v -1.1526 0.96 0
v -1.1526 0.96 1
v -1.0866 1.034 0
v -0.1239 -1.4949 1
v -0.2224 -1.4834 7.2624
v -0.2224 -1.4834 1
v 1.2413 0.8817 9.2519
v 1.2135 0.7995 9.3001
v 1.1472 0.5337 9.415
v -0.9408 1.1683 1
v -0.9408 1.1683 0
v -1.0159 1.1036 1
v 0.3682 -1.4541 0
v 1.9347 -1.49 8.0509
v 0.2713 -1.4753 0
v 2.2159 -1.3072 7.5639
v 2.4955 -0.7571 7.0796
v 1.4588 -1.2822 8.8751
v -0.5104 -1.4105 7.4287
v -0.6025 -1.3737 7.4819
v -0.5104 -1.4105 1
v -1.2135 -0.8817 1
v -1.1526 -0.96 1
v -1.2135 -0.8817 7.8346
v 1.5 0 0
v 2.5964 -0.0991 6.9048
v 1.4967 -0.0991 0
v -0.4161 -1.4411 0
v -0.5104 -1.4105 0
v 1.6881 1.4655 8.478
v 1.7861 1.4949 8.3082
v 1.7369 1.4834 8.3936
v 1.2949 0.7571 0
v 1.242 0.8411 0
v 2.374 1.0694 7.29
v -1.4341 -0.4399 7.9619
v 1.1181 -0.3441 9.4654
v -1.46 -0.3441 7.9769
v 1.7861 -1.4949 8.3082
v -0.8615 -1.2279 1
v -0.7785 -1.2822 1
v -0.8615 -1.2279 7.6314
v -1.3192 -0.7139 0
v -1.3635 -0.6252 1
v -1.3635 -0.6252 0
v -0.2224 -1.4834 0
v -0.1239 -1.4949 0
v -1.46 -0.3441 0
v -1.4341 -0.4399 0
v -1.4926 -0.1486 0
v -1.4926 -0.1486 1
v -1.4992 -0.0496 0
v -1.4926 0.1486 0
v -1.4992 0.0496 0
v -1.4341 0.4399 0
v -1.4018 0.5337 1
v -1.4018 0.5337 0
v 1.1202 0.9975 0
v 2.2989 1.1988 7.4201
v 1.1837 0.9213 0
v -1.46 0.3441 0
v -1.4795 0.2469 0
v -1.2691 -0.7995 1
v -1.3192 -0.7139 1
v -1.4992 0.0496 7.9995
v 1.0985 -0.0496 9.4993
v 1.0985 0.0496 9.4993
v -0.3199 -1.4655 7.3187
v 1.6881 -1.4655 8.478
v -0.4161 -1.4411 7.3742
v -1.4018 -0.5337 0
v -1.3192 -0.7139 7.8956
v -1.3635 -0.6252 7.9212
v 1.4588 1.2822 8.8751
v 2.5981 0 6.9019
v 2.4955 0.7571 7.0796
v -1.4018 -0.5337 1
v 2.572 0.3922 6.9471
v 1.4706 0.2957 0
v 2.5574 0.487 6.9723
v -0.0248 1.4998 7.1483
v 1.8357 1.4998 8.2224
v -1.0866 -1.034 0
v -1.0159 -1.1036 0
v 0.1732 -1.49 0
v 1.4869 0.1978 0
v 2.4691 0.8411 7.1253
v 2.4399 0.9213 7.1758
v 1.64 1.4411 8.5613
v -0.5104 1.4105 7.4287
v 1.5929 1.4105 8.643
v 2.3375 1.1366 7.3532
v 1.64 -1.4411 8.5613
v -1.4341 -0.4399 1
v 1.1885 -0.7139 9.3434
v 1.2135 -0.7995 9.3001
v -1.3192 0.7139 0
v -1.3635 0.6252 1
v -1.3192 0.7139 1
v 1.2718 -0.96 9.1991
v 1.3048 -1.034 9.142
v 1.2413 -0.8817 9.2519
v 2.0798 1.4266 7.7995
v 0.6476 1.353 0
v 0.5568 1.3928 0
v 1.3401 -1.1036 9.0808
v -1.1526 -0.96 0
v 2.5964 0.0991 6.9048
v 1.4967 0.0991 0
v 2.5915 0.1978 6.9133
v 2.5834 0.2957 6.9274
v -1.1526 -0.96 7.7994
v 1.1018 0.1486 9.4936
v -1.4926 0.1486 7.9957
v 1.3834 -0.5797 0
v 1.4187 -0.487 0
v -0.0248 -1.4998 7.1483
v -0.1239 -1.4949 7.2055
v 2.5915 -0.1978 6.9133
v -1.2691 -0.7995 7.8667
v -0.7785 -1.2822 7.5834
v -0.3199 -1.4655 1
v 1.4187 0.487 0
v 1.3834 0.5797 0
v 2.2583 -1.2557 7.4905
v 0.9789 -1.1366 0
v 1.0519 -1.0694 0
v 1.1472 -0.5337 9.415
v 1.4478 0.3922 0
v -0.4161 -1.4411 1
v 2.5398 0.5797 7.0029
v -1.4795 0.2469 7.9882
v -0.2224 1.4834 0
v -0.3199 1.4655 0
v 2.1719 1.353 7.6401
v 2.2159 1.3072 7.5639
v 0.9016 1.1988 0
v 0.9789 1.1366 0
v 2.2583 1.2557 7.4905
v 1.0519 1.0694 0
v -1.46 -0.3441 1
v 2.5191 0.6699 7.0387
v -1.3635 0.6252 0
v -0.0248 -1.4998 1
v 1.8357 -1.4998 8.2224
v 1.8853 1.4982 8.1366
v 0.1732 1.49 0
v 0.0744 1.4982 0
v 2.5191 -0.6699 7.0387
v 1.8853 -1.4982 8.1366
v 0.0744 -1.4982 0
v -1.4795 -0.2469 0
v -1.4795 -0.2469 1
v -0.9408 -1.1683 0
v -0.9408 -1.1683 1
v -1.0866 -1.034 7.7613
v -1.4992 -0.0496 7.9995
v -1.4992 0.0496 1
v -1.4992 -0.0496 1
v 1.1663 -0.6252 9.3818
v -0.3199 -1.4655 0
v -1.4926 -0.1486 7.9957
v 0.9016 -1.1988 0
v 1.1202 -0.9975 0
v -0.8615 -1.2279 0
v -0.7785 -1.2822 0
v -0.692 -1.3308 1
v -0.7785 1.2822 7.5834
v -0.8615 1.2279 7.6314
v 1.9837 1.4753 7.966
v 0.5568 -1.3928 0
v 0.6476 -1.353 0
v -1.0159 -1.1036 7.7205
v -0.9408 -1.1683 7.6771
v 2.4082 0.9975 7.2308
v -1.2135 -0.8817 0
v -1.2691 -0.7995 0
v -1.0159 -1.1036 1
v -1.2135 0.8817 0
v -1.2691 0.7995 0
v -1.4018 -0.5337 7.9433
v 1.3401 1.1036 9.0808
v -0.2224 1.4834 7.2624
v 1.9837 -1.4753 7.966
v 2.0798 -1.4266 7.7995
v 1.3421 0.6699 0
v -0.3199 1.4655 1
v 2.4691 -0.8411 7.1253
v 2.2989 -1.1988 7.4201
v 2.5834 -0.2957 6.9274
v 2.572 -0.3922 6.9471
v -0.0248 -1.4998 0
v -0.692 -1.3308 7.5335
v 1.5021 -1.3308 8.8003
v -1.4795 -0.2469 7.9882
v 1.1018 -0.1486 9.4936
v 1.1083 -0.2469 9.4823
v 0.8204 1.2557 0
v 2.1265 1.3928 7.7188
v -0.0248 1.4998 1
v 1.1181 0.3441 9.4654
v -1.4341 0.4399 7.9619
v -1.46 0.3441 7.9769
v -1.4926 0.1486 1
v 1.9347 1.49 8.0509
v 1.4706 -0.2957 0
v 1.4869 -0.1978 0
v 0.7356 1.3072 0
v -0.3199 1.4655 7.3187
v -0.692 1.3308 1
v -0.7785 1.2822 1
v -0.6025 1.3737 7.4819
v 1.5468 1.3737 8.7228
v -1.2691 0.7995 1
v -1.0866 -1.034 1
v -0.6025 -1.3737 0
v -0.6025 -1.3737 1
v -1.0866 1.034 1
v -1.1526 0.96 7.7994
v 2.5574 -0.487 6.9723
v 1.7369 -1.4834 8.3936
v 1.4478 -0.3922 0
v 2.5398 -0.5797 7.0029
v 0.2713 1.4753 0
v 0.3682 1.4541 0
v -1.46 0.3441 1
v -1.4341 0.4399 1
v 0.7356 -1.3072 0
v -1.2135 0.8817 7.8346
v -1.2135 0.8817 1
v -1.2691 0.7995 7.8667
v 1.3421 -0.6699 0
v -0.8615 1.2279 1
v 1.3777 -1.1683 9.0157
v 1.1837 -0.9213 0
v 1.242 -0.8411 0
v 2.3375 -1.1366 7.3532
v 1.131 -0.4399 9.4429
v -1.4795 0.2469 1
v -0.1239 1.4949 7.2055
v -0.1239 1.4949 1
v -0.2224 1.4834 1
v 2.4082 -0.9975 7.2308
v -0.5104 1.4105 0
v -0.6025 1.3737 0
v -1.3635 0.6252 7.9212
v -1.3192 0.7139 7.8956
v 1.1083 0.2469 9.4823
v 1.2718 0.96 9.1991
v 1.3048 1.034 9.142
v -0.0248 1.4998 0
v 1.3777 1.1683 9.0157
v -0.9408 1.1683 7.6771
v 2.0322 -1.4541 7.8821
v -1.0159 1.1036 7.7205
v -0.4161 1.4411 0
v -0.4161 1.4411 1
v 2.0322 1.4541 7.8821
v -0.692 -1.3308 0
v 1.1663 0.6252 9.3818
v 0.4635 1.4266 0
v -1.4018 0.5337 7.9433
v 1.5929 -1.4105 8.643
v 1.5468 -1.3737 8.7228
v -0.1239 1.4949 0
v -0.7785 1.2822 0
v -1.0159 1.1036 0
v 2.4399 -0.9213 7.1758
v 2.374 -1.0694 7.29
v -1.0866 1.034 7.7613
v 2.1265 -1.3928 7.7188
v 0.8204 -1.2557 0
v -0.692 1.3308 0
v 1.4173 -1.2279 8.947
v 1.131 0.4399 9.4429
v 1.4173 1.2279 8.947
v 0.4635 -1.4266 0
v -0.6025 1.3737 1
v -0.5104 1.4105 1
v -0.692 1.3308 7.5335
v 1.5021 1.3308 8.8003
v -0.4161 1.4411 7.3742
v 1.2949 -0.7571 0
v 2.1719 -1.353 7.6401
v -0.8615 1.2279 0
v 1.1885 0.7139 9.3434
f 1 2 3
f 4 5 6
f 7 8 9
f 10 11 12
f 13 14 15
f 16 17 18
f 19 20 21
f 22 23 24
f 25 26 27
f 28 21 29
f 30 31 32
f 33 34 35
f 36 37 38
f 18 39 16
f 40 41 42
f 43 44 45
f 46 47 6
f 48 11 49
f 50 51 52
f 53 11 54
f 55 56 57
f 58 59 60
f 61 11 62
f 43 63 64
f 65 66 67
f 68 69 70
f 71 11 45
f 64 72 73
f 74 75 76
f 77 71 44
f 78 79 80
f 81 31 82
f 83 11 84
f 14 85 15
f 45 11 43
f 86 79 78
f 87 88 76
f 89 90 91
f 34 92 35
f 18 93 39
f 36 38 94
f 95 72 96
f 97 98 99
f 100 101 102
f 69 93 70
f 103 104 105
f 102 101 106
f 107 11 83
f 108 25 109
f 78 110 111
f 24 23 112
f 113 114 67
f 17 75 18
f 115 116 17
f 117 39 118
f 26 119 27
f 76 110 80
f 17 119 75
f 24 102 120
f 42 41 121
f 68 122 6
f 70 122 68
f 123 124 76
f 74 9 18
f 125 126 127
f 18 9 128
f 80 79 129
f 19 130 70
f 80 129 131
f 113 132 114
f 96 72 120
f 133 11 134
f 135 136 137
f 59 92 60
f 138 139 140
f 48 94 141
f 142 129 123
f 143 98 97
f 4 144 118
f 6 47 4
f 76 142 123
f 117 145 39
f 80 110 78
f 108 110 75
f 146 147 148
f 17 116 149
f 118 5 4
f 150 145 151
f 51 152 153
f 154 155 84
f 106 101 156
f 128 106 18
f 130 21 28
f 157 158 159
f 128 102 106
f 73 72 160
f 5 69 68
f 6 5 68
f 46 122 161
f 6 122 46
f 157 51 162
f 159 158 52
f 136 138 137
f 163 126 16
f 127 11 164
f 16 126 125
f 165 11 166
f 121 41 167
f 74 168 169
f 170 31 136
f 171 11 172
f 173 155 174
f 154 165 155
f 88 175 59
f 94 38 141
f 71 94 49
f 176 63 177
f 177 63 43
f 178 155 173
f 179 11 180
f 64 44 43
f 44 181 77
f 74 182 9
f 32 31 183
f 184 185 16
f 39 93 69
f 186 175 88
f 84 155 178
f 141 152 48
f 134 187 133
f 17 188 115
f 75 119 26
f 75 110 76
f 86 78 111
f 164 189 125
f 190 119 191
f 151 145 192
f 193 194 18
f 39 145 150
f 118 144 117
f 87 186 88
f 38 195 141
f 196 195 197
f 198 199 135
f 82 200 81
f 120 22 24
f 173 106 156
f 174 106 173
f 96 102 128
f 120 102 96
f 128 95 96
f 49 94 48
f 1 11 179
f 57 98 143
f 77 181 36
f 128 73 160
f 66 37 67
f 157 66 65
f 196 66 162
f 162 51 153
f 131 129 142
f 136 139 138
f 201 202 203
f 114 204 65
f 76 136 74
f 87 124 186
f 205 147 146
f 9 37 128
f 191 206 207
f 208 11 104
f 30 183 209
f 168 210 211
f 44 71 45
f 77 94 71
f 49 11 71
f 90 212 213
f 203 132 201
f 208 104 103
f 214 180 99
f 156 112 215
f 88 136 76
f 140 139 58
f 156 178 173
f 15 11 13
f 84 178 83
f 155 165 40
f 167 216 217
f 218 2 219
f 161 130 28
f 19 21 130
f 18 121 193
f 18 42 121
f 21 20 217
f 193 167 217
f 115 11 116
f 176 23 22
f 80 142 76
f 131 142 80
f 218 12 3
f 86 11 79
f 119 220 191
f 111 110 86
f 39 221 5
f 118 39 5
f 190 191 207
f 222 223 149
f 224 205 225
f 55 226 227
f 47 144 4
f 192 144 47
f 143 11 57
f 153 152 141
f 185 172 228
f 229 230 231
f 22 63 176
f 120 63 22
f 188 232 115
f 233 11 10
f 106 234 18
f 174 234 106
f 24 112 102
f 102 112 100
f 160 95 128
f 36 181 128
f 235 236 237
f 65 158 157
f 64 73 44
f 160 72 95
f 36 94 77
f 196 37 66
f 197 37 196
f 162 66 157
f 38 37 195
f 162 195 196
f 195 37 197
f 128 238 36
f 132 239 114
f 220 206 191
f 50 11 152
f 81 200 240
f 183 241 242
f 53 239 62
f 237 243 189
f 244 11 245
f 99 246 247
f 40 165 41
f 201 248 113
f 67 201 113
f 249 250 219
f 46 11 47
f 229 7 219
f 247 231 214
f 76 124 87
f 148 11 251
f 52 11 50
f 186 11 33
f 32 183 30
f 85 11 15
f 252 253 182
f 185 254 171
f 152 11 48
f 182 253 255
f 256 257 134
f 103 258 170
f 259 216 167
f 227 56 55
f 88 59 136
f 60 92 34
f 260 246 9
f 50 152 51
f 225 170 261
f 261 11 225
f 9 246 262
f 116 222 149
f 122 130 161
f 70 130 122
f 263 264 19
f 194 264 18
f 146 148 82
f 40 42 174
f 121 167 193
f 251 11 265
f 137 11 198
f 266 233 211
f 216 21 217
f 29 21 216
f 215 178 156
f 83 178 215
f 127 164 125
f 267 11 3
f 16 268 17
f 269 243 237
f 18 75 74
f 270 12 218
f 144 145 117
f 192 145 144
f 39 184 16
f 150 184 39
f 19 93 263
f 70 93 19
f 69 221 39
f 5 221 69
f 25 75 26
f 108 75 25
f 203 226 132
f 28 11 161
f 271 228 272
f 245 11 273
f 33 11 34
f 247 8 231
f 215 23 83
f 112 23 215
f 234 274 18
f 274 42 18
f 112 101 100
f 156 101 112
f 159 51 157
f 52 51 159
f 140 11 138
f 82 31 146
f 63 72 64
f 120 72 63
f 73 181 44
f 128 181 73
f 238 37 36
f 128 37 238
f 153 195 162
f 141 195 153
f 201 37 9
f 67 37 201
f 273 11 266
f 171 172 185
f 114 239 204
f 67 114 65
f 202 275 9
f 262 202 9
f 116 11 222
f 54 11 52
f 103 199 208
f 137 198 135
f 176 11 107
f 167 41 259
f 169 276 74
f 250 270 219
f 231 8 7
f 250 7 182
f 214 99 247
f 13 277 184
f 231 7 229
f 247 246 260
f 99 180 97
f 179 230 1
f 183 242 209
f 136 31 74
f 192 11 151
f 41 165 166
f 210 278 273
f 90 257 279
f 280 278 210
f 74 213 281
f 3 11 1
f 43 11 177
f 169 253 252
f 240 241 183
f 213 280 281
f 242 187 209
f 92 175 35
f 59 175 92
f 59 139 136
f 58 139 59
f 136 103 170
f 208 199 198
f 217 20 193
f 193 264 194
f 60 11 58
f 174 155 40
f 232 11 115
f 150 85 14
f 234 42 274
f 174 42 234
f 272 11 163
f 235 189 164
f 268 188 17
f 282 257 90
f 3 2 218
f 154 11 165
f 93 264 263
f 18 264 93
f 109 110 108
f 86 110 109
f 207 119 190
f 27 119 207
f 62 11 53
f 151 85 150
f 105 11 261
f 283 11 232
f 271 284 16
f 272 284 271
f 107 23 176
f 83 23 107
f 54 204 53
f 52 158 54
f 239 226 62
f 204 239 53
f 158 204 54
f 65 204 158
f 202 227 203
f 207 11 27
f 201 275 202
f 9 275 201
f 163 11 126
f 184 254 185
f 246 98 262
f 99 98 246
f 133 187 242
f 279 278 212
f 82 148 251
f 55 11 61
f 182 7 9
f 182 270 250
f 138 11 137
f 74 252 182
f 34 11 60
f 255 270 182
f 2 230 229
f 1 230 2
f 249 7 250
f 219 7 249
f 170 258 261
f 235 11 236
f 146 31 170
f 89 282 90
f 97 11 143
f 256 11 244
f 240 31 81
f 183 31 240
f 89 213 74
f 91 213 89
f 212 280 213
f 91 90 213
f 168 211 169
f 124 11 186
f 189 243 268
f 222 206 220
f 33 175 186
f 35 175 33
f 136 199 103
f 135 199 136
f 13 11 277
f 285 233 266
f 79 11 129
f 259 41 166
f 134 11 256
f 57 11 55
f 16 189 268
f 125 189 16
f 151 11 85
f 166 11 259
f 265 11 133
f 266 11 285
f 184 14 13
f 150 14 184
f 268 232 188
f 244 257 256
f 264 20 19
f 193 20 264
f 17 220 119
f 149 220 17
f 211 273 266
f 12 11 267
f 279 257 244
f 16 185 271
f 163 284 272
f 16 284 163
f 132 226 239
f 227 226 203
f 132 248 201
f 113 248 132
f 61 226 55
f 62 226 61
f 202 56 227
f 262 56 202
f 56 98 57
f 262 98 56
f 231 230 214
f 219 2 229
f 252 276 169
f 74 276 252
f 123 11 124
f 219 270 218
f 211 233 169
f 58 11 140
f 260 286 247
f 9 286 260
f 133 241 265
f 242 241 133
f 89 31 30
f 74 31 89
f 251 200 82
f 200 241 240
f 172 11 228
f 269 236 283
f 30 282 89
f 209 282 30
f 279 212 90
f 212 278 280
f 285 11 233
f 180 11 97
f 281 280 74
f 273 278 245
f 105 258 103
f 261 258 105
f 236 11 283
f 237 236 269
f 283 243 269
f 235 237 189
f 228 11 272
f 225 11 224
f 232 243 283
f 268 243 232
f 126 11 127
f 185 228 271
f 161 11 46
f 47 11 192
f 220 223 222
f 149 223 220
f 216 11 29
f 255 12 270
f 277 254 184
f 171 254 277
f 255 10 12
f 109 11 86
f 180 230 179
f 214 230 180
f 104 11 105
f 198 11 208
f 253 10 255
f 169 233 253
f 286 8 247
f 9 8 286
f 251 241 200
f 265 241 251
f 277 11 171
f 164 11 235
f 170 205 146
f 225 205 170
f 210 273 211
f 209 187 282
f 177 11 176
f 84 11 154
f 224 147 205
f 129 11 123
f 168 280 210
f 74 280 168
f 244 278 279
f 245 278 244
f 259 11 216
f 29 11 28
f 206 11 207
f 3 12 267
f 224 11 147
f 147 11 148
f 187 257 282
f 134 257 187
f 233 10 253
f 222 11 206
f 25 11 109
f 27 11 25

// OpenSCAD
$fa=0.1;
$fs=0.1;

module fanHolderScrewLug(a=60,l1=10,l2=10,d=3) {
hull() {
difference() {
  cylinder(d=d,l1=10);
  translate([-(d)/2,-(d+1)/2,l1])
    rotate([0,a/2,0])
      #cube([d/cos(a/2)+1,d+1,l1]);
}

translate([-d/2,0,l1])
rotate([0,a,0])
translate([d/2,0,l2])
mirror([0,0,1])
  difference() {
    cylinder(d=d,h=l2);
    translate([-(d)/2,-(d+1)/2,l2])
      rotate([0,a/2,0])
        #cube([5/cos(a/2)+1,5+1,l2]);
}
}
}

fanHolderScrewLug(l1=8,l2=3);
